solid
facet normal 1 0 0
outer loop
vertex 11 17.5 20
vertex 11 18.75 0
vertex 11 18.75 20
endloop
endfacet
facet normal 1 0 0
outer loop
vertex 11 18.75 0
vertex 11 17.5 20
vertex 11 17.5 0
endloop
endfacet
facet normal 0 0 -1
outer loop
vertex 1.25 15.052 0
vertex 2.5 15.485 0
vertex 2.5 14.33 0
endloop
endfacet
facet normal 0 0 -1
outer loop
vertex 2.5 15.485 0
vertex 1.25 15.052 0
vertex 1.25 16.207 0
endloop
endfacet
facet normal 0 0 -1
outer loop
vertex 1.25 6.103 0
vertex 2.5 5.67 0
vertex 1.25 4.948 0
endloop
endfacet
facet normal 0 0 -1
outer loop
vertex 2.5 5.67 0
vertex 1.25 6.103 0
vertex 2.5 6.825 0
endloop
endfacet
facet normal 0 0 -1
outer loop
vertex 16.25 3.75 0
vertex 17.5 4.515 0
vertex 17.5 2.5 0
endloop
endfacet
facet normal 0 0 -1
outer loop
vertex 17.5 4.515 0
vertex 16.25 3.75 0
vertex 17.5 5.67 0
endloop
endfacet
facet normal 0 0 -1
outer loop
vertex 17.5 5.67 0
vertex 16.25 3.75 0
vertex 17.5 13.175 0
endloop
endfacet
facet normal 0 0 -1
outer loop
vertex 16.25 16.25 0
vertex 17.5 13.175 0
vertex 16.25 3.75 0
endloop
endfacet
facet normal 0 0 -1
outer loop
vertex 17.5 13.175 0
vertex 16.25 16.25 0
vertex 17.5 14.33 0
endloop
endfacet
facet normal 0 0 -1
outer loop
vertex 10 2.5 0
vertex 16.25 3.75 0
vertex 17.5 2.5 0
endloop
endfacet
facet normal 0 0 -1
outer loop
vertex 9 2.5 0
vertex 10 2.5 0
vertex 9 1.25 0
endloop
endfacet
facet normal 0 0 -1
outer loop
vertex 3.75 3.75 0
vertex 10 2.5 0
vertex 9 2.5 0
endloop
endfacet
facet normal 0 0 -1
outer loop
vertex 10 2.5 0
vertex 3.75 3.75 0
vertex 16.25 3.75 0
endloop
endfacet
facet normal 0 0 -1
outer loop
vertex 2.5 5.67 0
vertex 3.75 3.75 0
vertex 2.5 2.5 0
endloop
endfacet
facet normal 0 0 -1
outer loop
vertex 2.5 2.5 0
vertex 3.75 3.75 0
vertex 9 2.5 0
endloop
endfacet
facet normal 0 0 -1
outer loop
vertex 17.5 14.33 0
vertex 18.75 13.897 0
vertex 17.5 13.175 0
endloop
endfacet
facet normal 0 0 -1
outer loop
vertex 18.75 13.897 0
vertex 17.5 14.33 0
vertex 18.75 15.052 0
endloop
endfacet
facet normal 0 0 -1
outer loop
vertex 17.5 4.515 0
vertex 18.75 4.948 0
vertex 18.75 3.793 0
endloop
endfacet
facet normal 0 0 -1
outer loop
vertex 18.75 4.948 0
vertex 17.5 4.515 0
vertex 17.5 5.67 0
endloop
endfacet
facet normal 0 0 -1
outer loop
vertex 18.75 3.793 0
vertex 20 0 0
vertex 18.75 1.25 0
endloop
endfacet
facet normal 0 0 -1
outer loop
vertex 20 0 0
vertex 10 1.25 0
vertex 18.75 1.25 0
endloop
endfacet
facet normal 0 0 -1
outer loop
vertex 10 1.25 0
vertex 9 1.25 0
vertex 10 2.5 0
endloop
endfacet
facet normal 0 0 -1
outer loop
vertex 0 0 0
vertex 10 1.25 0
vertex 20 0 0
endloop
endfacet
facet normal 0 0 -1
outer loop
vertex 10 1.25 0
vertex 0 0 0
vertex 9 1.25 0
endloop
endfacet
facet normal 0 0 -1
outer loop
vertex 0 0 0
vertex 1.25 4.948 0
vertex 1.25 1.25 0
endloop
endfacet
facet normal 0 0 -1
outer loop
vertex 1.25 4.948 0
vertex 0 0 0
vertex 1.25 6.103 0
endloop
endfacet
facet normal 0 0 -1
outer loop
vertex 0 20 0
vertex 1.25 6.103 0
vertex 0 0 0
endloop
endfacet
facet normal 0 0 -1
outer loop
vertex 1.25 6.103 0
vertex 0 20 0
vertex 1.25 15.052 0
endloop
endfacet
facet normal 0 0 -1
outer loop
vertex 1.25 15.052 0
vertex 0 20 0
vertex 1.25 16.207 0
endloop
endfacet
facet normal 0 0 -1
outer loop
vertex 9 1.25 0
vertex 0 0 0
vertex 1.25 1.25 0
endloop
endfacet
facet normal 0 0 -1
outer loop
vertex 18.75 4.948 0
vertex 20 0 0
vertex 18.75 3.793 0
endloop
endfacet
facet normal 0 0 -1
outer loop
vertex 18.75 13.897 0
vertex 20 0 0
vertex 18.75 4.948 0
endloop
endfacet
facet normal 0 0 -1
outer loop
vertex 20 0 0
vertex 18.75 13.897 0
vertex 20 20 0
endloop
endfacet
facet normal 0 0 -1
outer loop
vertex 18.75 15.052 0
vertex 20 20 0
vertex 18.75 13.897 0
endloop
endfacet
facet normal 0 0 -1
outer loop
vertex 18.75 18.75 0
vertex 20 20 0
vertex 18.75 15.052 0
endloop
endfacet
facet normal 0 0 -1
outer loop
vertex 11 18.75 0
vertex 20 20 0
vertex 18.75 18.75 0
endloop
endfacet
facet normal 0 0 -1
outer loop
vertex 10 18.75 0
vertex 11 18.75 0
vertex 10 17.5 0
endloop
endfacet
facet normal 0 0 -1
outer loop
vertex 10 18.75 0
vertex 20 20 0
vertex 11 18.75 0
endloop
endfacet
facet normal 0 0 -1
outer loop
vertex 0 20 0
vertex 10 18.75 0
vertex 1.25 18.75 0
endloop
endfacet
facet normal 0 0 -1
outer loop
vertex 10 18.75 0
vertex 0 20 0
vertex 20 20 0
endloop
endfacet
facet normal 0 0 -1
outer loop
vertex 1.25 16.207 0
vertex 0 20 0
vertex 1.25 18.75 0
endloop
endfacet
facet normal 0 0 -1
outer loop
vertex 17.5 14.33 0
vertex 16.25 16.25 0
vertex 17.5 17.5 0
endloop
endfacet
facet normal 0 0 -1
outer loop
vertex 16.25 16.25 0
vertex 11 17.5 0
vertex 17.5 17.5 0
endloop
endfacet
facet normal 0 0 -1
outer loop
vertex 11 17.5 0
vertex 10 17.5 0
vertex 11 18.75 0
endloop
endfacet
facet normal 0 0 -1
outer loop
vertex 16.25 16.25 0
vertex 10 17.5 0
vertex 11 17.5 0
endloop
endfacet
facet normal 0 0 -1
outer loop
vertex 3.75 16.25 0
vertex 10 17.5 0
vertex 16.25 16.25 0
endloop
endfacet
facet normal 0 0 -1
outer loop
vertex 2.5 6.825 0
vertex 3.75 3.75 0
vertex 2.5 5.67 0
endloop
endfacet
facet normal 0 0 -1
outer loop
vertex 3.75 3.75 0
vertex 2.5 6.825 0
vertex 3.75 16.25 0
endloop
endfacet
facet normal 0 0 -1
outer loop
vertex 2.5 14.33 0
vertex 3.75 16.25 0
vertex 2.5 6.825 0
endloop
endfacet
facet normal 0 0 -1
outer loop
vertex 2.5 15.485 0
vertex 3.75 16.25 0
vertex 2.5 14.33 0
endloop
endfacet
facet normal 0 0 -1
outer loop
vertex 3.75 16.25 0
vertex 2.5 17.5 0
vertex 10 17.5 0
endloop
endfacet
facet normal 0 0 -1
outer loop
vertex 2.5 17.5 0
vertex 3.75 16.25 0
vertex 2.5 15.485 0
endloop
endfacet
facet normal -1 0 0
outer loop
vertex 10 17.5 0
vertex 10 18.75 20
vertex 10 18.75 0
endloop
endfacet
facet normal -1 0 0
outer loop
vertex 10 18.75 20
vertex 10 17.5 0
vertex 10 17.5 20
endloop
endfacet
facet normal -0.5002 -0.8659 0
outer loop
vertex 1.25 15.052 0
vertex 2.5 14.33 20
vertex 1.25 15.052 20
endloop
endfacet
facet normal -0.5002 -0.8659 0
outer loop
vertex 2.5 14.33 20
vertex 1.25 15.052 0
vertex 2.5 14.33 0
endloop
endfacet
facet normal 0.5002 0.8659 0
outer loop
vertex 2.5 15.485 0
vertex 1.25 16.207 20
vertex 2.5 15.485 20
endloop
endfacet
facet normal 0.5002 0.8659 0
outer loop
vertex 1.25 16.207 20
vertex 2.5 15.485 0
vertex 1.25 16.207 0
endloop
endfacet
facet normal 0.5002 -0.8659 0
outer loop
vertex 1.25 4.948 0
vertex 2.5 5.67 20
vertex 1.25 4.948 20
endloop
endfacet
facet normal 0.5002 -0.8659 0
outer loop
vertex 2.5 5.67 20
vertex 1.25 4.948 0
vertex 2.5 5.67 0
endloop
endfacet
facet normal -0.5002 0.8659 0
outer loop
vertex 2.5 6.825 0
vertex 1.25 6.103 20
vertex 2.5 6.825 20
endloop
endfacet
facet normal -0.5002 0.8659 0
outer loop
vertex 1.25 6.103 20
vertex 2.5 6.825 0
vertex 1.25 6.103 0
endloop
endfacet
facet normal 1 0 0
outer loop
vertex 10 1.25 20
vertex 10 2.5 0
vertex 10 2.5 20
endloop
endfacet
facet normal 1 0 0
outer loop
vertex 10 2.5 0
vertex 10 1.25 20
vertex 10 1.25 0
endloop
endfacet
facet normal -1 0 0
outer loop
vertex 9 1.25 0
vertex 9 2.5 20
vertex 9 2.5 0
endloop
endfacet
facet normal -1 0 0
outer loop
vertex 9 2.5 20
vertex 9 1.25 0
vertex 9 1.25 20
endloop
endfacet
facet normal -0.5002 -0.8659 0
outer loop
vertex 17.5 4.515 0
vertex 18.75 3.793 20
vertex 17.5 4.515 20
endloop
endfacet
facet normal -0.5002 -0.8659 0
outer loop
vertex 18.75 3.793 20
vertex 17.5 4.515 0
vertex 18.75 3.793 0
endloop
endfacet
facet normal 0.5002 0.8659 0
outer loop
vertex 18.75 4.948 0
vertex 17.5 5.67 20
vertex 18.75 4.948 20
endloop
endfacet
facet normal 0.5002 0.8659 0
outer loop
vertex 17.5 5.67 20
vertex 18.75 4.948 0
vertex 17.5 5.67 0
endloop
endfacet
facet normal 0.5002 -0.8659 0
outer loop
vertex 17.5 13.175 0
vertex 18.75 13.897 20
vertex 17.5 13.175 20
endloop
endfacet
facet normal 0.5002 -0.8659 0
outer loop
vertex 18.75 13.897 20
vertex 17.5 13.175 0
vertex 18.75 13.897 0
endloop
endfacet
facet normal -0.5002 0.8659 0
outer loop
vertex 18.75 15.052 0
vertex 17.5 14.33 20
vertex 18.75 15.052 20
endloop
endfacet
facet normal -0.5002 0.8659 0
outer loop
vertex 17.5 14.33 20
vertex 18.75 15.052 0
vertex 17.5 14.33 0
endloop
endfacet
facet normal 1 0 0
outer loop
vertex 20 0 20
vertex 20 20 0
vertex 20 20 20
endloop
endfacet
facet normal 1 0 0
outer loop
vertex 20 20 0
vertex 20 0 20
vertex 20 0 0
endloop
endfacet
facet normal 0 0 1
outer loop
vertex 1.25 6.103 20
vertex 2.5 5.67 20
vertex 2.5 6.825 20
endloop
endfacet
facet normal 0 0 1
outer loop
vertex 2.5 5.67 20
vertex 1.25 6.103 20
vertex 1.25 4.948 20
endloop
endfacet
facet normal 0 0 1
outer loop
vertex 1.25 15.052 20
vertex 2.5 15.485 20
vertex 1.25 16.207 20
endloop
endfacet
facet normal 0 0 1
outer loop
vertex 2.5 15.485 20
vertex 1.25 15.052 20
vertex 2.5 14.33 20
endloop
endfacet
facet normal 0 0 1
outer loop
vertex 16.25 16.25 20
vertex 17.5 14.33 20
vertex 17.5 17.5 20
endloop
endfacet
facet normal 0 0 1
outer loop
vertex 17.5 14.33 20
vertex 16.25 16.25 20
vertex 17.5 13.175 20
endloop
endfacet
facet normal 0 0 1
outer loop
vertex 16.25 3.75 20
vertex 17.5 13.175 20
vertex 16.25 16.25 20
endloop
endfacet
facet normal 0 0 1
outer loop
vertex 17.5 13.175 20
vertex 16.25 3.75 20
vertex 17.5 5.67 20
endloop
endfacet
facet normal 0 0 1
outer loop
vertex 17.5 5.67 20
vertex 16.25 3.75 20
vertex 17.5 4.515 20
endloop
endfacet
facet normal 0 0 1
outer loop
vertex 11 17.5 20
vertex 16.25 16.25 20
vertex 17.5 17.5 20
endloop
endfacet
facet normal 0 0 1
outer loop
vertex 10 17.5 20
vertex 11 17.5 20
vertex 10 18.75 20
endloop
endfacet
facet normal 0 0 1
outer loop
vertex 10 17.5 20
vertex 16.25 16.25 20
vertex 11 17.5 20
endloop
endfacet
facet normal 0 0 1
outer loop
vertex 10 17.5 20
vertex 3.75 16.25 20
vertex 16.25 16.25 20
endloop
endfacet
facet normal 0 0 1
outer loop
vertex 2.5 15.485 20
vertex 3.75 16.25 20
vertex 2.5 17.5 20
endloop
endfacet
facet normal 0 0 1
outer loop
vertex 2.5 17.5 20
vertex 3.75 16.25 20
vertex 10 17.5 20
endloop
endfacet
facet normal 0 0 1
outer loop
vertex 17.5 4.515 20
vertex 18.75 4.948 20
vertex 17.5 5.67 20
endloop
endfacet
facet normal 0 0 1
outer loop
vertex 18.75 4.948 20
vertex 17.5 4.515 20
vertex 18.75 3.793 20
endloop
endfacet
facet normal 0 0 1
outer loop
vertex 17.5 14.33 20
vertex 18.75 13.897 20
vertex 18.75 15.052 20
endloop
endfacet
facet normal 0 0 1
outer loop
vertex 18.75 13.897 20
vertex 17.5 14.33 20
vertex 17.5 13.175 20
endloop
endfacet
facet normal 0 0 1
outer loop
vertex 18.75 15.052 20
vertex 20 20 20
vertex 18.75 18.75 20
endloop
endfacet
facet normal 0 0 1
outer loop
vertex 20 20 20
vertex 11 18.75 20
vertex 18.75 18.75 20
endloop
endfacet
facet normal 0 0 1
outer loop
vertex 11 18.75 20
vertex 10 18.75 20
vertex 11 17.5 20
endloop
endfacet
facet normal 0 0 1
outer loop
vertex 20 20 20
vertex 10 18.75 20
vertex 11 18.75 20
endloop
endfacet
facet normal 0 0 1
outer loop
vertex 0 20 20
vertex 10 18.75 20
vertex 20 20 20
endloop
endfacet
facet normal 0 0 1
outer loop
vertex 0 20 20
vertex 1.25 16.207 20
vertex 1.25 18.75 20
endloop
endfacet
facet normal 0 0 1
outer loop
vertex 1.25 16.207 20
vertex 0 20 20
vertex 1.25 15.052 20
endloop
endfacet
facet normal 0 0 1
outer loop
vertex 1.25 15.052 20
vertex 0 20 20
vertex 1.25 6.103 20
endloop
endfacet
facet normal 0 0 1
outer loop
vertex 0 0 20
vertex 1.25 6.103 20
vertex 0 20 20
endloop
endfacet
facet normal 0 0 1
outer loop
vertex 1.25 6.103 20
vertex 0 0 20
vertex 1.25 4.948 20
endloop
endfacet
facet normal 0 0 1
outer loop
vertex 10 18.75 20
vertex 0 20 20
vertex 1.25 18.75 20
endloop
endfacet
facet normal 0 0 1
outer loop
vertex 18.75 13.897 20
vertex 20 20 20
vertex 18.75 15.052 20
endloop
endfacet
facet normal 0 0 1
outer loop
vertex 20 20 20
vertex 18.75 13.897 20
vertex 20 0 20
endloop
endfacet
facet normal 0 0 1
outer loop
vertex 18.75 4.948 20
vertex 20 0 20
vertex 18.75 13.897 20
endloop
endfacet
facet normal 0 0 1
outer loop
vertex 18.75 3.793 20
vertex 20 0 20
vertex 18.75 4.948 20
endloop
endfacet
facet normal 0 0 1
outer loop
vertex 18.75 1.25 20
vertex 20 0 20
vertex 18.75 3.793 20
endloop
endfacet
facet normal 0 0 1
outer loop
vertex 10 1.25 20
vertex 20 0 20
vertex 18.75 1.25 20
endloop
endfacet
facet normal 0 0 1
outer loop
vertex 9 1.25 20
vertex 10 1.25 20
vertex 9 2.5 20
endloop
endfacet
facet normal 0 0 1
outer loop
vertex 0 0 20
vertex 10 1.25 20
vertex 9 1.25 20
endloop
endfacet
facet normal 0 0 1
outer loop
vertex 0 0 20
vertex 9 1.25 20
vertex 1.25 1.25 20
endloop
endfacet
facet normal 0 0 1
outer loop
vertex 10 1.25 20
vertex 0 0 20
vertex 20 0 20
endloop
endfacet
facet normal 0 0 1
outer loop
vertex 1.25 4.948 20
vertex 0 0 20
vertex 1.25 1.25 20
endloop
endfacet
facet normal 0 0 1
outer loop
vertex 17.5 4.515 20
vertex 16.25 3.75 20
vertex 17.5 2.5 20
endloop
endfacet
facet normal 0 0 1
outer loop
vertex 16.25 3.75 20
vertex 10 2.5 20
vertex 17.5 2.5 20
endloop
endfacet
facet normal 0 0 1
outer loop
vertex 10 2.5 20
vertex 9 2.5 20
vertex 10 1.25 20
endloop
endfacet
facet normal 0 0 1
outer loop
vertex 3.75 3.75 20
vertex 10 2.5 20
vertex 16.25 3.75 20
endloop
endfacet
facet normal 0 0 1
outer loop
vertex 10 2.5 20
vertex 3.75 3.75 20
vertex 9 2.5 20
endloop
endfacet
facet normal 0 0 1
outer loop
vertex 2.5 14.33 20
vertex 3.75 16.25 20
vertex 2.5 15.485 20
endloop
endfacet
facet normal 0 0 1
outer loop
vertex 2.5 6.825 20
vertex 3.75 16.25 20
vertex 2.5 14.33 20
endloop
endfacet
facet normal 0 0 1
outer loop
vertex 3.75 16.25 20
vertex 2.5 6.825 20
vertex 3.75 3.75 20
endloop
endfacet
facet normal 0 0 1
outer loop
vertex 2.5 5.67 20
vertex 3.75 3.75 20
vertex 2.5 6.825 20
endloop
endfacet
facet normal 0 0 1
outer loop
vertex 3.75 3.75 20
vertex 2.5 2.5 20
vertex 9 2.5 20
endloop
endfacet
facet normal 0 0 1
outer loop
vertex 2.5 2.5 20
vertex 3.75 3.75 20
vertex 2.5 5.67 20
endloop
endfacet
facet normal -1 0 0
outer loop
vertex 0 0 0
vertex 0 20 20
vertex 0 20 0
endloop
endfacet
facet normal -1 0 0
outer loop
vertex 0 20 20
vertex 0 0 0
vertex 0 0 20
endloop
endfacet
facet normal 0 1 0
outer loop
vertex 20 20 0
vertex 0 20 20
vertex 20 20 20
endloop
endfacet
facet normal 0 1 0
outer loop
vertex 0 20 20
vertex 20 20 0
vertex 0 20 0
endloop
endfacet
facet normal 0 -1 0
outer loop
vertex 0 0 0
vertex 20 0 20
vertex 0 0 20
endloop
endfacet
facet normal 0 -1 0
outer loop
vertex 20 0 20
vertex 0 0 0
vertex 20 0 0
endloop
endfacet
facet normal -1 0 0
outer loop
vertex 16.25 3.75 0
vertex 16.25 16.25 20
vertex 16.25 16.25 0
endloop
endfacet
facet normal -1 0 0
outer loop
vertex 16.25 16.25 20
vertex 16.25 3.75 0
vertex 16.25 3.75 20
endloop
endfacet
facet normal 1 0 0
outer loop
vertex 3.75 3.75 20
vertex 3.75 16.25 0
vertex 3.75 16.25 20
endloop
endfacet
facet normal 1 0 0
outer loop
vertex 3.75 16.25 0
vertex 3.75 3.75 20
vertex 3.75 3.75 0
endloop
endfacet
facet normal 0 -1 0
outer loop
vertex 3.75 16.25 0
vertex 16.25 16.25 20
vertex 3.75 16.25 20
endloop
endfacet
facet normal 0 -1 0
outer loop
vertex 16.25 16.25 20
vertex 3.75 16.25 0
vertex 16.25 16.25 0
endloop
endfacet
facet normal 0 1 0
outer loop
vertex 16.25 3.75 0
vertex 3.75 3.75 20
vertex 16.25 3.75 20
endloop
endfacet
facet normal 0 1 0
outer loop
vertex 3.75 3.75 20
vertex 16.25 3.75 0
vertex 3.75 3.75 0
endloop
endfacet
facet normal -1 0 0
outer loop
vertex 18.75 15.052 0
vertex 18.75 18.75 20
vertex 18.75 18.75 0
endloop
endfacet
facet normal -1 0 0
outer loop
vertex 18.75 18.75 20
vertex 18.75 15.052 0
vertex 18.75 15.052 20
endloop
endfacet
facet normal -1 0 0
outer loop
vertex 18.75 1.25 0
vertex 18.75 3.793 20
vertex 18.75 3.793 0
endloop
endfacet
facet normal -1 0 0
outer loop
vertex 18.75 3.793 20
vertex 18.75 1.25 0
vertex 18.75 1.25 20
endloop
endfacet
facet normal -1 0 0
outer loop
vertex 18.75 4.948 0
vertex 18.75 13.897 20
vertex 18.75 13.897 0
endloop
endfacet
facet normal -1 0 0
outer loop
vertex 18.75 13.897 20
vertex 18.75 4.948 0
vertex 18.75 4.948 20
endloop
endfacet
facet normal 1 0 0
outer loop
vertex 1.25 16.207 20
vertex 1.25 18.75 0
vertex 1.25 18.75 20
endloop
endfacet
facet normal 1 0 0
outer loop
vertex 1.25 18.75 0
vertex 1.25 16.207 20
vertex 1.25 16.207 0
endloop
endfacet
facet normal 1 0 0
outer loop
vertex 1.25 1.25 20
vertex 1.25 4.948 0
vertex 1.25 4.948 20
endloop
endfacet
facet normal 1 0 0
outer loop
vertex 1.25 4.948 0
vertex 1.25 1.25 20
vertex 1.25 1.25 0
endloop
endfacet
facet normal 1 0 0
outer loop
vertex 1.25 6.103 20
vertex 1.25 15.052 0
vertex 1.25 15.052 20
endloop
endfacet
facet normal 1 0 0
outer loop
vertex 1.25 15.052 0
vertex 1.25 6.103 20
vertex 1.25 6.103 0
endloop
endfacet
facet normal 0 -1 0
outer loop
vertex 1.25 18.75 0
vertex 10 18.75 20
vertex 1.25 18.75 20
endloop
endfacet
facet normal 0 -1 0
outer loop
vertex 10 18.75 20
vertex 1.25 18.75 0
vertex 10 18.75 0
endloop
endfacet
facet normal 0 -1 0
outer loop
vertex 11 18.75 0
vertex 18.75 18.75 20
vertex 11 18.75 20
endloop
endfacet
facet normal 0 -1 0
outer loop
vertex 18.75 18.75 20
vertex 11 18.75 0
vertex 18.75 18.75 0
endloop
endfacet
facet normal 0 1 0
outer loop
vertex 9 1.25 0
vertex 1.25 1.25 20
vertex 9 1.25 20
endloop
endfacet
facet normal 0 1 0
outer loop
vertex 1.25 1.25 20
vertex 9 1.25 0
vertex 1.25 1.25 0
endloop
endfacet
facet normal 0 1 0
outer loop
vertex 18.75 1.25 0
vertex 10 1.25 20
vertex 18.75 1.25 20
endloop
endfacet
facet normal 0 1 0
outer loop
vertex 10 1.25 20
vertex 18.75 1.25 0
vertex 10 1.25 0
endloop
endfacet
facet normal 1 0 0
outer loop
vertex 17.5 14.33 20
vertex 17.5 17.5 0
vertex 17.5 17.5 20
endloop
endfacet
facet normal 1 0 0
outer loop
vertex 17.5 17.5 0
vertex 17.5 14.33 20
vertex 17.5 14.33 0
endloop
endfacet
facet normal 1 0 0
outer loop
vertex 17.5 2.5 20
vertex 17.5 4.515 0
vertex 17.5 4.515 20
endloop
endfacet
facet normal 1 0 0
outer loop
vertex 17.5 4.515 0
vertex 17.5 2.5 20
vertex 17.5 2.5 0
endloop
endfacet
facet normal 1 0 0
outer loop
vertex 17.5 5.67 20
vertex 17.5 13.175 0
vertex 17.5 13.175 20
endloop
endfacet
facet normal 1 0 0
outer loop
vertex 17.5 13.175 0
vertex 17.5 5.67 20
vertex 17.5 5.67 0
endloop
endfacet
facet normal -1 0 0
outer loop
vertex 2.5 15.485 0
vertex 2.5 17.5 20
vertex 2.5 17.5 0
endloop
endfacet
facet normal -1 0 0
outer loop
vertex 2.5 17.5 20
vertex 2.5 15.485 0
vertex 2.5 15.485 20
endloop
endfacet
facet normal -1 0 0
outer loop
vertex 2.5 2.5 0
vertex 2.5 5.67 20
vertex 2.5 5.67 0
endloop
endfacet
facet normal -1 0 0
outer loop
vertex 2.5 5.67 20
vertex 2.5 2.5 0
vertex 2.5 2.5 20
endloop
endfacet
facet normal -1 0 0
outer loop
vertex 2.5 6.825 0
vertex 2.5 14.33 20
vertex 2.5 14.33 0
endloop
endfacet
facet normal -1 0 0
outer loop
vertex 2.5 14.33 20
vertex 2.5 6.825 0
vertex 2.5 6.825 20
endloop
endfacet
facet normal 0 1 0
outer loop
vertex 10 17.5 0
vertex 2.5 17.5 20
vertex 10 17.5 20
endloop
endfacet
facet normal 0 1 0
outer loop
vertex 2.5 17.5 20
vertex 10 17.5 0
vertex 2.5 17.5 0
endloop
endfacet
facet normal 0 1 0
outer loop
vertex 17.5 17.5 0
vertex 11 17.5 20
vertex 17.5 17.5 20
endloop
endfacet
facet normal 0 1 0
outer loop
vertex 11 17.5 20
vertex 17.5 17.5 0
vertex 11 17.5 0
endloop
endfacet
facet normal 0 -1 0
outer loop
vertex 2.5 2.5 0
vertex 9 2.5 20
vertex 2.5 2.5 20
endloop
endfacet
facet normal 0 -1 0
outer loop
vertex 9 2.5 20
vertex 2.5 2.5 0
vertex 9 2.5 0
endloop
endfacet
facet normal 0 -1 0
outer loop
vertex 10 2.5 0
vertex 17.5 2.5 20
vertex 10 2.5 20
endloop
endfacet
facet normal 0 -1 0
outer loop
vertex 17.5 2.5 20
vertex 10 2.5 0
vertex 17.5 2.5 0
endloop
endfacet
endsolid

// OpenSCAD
//Copyright 2013 Alex Davies

//    This file is part of pareospike.

//    Foobar is free software: you can redistribute it and/or modify
//    it under the terms of the GNU Affero General Public License as published by
//    the Free Software Foundation, either version 3 of the License, or
//    (at your option) any later version.

//    Foobar is distributed in the hope that it will be useful,
//    but WITHOUT ANY WARRANTY; without even the implied warranty of
//    MERCHANTABILITY or FITNESS FOR A PARTICULAR PURPOSE.  See the
//    GNU Affero General Public License for more details.

//    You should have received a copy of the GNU Affero General Public License
//    along with pareospike.  If not, see <http://www.gnu.org/licenses/>.

//use<shapehelper.scad>;

outerdiam=40;
outercutdiam=35;

innerdiam=30;
innercutdiam=25;

wallthickness=1;
numberofwalls=6;

intersection()
{

	translate([(outerdiam)/4,(outerdiam)/4,0])for ( i = [0 : numberofwalls] )
	{
	    rotate( i * 360 / numberofwalls, [0, 0, 1])
	    cube([wallthickness,outerdiam+200,outerdiam+200]);
	}
	difference()
	{
		scale([outerdiam/2,outerdiam/2,outerdiam/2])aeroshape();
		translate([(outerdiam-innercutdiam)/4,(outerdiam-innercutdiam)/4,0])scale([innercutdiam/2,innercutdiam/2,outerdiam/2])aeroshape();

	}
}

difference(){
	scale([outerdiam/2,outerdiam/2,outerdiam/2])aeroshape();
	translate([(outerdiam-outercutdiam)/4,(outerdiam-outercutdiam)/4,0])scale([outercutdiam/2,outercutdiam/2,outerdiam/2])aeroshape();

}

translate([(outerdiam-innerdiam)/4,(outerdiam-innerdiam)/4,0])difference(){
	scale([innerdiam/2,innerdiam/2,outerdiam/2])aeroshape();
	translate([(innerdiam-innercutdiam)/4,(innerdiam-innercutdiam)/4,0])scale([innercutdiam/2,innercutdiam/2,outerdiam/2])aeroshape();

}

module aeroshape(){
	cube(1,1,1);
}
